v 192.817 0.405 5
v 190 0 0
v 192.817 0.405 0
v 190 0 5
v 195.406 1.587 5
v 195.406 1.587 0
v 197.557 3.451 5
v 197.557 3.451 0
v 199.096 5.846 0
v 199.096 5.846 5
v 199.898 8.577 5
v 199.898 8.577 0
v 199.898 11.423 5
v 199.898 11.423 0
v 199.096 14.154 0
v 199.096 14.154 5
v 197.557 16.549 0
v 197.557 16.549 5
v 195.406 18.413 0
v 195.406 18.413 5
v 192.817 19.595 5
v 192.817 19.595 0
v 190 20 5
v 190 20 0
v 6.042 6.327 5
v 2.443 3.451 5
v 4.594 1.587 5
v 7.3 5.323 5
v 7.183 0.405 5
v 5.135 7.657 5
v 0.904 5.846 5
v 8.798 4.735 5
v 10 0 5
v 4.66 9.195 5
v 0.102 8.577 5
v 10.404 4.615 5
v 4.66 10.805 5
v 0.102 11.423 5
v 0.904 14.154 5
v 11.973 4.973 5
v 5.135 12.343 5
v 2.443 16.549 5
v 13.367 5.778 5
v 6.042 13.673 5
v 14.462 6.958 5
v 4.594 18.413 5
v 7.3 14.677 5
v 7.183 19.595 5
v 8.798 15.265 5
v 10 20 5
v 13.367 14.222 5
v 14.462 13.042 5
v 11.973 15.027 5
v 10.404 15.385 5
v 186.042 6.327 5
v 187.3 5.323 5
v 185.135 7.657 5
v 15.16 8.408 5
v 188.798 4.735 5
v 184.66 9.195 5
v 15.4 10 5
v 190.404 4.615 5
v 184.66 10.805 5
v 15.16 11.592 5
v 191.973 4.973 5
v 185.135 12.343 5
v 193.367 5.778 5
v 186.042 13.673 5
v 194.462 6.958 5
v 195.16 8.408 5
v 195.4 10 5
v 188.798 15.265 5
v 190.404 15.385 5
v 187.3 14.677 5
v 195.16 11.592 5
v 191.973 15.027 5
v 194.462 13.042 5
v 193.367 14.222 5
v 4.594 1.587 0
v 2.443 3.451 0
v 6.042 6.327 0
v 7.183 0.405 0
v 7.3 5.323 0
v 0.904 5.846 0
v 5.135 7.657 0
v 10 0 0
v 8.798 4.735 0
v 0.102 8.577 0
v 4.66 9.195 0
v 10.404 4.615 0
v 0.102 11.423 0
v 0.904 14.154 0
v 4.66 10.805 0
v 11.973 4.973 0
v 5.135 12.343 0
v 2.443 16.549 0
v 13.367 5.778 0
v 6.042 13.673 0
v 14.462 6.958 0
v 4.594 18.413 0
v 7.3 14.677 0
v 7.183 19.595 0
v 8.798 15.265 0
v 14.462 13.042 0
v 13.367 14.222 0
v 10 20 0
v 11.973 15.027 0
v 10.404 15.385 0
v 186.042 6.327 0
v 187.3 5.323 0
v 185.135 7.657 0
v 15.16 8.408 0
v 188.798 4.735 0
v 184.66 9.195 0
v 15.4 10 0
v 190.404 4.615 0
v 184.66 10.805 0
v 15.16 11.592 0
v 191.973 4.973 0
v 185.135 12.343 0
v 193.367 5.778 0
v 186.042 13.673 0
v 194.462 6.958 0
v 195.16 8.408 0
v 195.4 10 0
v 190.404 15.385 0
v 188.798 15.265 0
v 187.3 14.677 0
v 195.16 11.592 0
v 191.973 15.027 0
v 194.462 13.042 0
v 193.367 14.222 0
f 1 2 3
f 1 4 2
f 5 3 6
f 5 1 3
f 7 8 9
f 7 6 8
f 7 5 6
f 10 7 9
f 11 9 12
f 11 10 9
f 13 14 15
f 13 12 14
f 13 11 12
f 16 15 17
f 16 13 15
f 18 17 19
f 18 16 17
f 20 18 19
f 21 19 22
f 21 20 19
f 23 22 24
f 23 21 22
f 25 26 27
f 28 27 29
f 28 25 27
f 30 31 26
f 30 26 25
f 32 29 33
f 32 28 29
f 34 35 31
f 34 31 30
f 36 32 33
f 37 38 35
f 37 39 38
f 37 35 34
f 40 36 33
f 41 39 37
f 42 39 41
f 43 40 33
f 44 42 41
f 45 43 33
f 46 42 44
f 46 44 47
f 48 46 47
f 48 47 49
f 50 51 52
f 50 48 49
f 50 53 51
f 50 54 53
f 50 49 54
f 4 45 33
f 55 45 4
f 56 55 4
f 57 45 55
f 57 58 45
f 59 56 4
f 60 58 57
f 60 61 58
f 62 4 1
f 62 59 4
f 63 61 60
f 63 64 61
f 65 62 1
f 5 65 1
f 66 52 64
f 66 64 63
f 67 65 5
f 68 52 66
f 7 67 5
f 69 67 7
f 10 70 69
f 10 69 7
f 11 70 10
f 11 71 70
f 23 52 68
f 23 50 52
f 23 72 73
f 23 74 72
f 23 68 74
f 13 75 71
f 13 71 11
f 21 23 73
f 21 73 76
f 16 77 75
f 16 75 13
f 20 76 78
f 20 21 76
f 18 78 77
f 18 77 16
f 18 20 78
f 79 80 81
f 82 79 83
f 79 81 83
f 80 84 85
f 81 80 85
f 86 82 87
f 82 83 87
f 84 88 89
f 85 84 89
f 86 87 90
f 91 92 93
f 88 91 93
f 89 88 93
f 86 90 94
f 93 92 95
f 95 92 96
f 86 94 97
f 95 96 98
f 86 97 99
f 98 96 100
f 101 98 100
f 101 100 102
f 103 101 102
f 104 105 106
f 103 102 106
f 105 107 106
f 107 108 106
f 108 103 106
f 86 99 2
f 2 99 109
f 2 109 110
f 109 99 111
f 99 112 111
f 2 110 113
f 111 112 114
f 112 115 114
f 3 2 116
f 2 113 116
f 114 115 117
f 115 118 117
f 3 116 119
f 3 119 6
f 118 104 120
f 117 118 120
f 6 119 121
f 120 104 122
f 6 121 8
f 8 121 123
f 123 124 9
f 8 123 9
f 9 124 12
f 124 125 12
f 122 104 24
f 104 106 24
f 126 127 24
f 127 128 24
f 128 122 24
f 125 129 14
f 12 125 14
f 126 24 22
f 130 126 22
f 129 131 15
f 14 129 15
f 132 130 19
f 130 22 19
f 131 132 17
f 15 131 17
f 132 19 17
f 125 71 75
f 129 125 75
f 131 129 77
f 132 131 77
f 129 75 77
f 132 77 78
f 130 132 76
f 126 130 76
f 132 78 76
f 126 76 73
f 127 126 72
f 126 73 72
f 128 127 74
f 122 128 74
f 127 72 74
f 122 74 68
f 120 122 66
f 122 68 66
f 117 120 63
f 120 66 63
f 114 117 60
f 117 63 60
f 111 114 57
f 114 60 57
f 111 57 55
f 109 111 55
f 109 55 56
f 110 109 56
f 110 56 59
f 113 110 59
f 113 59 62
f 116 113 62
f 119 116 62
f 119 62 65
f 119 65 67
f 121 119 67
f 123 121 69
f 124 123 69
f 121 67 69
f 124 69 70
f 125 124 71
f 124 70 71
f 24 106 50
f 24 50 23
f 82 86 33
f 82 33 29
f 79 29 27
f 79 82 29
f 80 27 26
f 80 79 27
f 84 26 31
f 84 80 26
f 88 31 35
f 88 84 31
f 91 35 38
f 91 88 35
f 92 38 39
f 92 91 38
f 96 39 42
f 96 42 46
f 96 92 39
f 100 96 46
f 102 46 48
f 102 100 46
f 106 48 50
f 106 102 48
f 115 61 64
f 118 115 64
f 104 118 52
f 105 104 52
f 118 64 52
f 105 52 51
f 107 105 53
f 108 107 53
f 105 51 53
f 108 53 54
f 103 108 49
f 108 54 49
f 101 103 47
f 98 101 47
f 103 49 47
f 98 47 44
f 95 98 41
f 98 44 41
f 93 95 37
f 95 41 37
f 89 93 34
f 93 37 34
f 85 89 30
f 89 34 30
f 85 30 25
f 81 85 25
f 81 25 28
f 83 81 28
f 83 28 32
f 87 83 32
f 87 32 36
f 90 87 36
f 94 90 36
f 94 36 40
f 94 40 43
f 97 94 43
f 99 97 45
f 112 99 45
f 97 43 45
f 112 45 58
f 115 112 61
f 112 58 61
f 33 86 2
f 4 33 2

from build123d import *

# Parameters (mm, degrees)
SKETCH1_W           = 200
SKETCH1_H           = 20
BOSS_EXTRUDE1_DEPTH = 5
FILLET1_RADIUS      = 10
FILLET1_LENGTH      = 5
FILLET2_RADIUS      = 10
FILLET2_LENGTH      = 5
SKETCH2_R           = 5.4
CUT_EXTRUDE1_DEPTH  = 5


with BuildPart() as part:
    # Sketch1 → Boss-Extrude1 (new body)
    with BuildSketch(Plane.XY):
        with Locations((100, 10)):
            Rectangle(SKETCH1_W, SKETCH1_H)
    extrude(amount=BOSS_EXTRUDE1_DEPTH)

    # Fillet1: full round fillet: the end face becomes a half cylinder, R = half its width
    fillet1_face = Plane((200, 10, 2.5), x_dir=(0, 0, 1), z_dir=(1, 0, 0))  # on the end face: x along it, z out of the body
    fillet1_slab = fillet1_face.offset(-FILLET1_RADIUS / 2) * Box(FILLET1_LENGTH, 2 * FILLET1_RADIUS, FILLET1_RADIUS, mode=Mode.PRIVATE)  # the body's end, R deep
    fillet1_round = Plane((190, 10, 2.5), x_dir=(1, 0, 0), z_dir=(0, 0, 1)) * Cylinder(FILLET1_RADIUS, FILLET1_LENGTH, mode=Mode.PRIVATE)  # its axis R under the face
    add(fillet1_slab - fillet1_round, mode=Mode.SUBTRACT)

    # Fillet2: full round fillet: the end face becomes a half cylinder, R = half its width
    fillet2_face = Plane((0, 10, 2.5), x_dir=(0, 0, -1), z_dir=(-1, 0, 0))  # on the end face: x along it, z out of the body
    fillet2_slab = fillet2_face.offset(-FILLET2_RADIUS / 2) * Box(FILLET2_LENGTH, 2 * FILLET2_RADIUS, FILLET2_RADIUS, mode=Mode.PRIVATE)  # the body's end, R deep
    fillet2_round = Plane((10, 10, 2.5), x_dir=(-1, 0, 0), z_dir=(0, 0, -1)) * Cylinder(FILLET2_RADIUS, FILLET2_LENGTH, mode=Mode.PRIVATE)  # its axis R under the face
    add(fillet2_slab - fillet2_round, mode=Mode.SUBTRACT)

    # Sketch2 → Cut-Extrude1 (cut)
    with BuildSketch(Plane.XY.offset(5)):
        with Locations((10, 10)):
            Circle(SKETCH2_R)
        with Locations((190, 10)):
            Circle(SKETCH2_R)
    extrude(amount=-CUT_EXTRUDE1_DEPTH, mode=Mode.SUBTRACT)


solid = part.part
